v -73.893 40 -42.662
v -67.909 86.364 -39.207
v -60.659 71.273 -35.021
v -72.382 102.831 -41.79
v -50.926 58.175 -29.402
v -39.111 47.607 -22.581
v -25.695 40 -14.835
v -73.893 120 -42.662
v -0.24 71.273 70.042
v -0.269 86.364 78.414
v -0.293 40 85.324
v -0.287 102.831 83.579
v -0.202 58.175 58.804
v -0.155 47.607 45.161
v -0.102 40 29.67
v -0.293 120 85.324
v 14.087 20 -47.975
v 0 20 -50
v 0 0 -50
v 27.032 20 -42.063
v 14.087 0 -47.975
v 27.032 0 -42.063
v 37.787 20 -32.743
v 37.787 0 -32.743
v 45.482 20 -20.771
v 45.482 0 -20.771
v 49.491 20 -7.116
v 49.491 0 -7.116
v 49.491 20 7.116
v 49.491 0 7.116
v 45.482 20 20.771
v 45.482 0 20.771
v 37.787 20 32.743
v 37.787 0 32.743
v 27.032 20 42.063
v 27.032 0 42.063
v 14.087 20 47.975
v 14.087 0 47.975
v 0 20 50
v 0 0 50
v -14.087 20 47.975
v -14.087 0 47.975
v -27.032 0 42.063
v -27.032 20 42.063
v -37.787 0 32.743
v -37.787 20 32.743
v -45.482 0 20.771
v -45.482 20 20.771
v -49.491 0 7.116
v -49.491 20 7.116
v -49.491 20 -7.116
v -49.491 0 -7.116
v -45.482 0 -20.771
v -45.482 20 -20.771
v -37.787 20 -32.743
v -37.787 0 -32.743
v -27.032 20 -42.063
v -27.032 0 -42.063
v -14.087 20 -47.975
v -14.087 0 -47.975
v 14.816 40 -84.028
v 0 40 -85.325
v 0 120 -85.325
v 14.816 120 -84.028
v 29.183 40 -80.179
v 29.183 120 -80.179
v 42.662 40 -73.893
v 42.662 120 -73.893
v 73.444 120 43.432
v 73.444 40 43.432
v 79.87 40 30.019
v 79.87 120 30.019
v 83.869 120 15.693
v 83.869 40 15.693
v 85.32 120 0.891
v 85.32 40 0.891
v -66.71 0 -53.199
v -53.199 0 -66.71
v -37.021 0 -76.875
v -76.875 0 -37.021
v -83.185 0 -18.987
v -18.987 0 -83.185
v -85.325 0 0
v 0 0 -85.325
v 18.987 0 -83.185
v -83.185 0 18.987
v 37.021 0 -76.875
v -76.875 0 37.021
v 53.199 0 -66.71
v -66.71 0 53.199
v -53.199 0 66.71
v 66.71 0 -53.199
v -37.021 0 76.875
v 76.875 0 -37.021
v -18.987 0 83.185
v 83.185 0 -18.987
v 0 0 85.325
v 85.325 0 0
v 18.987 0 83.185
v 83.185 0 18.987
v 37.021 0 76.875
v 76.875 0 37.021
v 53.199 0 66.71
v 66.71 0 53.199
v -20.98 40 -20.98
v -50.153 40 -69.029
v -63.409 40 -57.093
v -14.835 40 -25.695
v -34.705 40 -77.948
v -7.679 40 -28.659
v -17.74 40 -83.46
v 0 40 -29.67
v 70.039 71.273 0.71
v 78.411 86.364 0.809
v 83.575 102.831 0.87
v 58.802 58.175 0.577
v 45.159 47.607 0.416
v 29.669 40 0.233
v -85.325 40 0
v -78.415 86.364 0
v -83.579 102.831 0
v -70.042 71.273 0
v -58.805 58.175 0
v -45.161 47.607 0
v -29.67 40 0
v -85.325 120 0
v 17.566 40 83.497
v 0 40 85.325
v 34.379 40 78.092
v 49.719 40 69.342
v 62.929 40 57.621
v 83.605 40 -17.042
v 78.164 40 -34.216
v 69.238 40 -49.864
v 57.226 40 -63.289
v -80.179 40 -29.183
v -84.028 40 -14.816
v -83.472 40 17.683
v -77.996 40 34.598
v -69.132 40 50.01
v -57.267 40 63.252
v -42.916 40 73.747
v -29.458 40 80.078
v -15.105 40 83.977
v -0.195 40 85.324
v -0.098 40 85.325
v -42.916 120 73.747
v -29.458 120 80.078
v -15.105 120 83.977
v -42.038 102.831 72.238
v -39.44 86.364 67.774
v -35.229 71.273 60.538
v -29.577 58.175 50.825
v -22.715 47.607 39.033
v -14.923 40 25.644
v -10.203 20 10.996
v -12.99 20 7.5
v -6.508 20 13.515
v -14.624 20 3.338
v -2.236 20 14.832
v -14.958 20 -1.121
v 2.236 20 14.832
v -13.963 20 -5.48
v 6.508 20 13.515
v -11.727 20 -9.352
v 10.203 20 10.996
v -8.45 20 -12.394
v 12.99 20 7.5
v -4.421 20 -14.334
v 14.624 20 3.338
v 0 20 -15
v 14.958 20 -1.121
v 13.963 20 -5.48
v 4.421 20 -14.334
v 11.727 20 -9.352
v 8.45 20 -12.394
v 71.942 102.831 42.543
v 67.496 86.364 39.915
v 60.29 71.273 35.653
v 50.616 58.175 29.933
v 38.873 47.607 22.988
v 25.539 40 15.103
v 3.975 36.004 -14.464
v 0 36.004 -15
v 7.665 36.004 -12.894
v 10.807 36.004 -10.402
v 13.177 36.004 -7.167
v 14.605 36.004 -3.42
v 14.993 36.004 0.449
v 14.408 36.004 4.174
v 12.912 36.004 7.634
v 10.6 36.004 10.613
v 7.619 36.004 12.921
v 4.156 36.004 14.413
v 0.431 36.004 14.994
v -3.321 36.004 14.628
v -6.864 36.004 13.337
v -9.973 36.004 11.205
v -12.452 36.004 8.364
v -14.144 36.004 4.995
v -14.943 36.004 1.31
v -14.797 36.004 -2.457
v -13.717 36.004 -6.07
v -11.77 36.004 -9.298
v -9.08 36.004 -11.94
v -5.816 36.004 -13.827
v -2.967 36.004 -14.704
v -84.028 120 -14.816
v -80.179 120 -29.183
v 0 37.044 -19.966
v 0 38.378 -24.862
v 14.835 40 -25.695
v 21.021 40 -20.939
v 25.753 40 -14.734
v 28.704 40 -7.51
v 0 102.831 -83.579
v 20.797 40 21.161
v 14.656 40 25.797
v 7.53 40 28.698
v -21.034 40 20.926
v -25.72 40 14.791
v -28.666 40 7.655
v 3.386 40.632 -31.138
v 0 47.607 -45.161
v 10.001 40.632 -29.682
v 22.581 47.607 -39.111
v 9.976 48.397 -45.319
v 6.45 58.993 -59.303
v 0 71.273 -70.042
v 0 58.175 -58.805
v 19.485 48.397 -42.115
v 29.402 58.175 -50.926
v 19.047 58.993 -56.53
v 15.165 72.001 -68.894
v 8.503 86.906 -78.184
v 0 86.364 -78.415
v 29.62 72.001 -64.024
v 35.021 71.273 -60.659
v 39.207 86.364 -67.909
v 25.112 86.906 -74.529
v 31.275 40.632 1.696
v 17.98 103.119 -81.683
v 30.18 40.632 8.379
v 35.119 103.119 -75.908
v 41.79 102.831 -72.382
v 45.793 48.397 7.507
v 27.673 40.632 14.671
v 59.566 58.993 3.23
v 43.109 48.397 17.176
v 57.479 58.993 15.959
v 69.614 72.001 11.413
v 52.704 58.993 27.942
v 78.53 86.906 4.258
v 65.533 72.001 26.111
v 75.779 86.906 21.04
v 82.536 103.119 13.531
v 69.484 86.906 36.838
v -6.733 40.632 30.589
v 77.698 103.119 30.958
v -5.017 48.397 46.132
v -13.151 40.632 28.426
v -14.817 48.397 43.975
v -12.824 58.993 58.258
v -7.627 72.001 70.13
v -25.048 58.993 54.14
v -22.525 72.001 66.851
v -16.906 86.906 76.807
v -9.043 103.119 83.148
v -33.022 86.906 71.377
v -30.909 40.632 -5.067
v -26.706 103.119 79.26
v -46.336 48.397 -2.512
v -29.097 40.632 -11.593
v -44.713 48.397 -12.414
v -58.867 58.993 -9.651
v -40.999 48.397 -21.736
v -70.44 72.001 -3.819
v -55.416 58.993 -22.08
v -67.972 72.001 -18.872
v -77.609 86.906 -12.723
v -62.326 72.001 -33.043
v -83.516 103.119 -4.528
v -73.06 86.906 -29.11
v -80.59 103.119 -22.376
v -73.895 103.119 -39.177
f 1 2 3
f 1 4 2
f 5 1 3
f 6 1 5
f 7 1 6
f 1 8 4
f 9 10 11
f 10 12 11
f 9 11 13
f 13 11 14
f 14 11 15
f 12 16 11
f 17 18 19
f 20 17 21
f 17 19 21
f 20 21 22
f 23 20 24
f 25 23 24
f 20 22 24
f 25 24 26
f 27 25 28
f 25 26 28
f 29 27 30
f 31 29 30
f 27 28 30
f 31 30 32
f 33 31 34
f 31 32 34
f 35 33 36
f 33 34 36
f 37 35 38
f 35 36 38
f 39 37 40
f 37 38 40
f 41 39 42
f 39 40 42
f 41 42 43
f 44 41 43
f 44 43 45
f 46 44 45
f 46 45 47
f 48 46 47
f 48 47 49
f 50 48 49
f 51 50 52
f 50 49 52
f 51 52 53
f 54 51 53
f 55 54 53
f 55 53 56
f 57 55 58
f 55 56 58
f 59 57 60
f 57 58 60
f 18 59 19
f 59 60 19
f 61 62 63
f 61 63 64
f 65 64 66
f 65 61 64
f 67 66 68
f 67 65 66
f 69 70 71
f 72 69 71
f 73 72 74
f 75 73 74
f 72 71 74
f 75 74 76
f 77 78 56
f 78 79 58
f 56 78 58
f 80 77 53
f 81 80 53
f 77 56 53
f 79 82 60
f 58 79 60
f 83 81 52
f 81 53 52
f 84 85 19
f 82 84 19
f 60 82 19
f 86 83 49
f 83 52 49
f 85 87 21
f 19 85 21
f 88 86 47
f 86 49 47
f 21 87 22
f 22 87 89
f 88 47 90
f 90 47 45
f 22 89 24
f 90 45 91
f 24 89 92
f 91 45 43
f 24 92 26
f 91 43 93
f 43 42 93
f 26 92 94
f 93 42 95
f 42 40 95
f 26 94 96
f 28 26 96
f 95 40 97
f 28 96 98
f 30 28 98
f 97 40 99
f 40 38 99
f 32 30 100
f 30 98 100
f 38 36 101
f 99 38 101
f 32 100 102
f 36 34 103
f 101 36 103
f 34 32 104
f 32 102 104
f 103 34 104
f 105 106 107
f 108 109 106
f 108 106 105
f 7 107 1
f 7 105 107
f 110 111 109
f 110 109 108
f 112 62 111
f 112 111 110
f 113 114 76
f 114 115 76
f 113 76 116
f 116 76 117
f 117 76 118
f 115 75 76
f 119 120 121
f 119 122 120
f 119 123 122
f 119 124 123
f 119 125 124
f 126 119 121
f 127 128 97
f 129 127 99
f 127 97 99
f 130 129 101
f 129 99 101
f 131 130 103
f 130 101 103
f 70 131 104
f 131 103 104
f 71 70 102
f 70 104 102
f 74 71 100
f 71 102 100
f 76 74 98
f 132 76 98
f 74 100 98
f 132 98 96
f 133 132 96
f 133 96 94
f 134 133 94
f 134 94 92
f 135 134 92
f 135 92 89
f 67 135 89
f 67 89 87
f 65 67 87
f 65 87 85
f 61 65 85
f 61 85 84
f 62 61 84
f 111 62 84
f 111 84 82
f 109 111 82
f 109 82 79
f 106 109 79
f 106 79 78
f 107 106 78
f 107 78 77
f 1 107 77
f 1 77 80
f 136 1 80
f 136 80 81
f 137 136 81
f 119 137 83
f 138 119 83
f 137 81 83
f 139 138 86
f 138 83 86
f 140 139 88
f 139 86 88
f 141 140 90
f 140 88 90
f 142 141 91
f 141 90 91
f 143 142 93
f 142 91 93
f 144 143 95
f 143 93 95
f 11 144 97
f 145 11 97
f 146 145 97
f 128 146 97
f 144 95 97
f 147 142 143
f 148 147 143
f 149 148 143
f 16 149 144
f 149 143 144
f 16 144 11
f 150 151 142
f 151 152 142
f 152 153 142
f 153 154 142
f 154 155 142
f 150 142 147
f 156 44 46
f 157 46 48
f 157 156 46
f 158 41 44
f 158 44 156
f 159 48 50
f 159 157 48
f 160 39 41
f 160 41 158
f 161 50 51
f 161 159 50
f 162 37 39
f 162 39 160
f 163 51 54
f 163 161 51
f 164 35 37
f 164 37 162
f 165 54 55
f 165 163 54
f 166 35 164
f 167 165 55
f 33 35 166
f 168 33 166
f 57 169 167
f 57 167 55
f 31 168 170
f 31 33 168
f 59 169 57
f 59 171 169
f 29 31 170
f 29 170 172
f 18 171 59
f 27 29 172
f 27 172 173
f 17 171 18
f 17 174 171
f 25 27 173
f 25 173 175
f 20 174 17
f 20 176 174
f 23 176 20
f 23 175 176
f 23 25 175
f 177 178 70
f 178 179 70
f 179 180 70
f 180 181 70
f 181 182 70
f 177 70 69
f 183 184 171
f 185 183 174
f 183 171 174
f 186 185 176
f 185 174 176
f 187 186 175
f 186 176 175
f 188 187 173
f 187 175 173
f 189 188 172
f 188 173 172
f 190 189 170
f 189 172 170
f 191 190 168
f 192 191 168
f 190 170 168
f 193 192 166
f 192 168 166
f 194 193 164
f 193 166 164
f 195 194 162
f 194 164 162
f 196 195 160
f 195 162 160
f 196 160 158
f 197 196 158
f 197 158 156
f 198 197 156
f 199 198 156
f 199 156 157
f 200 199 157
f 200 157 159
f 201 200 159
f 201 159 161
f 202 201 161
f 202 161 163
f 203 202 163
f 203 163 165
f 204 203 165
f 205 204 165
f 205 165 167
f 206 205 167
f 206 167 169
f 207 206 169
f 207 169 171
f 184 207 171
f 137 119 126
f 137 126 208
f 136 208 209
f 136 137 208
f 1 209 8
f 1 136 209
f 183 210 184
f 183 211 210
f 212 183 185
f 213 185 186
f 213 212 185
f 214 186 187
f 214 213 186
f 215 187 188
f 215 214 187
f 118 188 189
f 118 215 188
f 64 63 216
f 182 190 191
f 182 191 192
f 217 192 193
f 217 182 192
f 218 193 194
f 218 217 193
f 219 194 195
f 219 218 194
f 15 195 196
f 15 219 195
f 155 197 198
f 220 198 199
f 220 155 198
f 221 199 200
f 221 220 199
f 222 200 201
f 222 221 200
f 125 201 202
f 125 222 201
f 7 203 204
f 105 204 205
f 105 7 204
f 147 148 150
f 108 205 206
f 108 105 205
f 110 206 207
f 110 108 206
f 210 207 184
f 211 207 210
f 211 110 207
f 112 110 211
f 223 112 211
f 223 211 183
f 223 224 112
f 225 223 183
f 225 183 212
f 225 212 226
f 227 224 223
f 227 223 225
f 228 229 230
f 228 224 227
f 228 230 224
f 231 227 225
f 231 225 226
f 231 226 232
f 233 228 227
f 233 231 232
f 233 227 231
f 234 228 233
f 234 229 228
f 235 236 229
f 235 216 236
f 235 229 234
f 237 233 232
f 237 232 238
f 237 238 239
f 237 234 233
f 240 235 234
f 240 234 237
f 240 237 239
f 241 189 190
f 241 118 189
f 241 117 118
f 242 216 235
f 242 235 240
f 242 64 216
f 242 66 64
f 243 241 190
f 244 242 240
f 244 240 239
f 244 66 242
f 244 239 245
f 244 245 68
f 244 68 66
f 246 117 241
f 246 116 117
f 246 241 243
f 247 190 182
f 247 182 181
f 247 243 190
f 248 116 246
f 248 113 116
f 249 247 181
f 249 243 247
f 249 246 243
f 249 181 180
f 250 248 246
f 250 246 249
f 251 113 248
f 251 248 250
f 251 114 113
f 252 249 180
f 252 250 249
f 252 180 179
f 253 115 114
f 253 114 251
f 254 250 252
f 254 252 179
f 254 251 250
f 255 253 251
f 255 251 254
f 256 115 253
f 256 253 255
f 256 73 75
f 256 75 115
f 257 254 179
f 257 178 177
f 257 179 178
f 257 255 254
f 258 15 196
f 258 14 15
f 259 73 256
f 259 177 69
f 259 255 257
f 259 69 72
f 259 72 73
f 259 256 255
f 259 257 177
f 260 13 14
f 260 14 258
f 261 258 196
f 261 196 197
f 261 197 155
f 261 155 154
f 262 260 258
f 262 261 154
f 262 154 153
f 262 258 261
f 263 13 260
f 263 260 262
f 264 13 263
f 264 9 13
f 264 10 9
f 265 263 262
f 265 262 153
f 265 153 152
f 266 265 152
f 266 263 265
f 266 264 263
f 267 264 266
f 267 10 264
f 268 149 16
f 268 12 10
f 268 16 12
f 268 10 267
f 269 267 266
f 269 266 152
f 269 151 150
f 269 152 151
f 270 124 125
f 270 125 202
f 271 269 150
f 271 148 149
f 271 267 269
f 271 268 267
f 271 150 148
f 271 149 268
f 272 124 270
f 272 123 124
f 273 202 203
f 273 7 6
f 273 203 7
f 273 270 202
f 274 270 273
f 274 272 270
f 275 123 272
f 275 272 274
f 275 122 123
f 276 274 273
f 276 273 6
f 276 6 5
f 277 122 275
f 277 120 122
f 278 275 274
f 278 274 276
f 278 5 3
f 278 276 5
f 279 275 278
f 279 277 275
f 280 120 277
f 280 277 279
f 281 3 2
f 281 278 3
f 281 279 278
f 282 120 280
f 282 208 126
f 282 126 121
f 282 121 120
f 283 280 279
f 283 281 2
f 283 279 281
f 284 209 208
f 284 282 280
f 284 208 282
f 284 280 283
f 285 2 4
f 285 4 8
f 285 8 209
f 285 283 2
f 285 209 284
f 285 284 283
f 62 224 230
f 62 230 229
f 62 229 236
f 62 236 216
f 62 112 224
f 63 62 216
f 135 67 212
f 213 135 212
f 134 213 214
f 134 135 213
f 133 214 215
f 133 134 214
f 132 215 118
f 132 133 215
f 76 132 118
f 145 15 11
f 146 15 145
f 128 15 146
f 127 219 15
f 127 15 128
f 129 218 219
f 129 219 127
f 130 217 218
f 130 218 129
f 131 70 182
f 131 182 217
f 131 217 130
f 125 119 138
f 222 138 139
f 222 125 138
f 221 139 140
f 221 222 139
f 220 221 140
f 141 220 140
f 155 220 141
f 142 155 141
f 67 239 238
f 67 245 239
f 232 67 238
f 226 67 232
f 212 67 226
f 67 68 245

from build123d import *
from build123d.topology import SkipClean

# Parameters (mm, degrees)
SKETCH1_R           = 85.32472163
BOSS_EXTRUDE1_DEPTH = 40
BOSS_EXTRUDE6_DEPTH = 80
SKETCH7_R           = 50
CUT_EXTRUDE1_DEPTH  = 20
SKETCH8_R           = 15
CUT_EXTRUDE2_DEPTH  = 60


with BuildPart() as part:
    # Sketch1 → Boss-Extrude1 (new body)
    with BuildSketch(Plane(origin=(0, 0, 0), x_dir=(1, 0, 0), z_dir=(0, 1, 0))):
        with Locations(Location((0, 0, 0), (0, 0, 270))):
            Circle(SKETCH1_R)
    extrude(amount=BOSS_EXTRUDE1_DEPTH)

    # Sketch2 → Boss-Extrude6 (add)
    with SkipClean():  # the faces are left unmerged after this step: merging them gives an invalid solid
        with BuildSketch(Plane(origin=(0, 40, 0), x_dir=(1, 0, 0), z_dir=(0, 1, 0))):
            with BuildLine():
                Line((8.607565416, -5.090168722), (73.443812301, -43.431722922))
                ThreePointArc((73.443812301, -43.431722922), (82.182232136, -22.943165483), (85.320068664, -0.89106923))
                Line((85.320068664, -0.89106923), (10, 0))
                ThreePointArc((10, 0), (9.645611804, -2.638592981), (8.607565416, -5.090168722))
            make_face()
            with BuildLine():
                Line((-5.02968533, -8.643047234), (-42.915650066, -73.746559925))
                ThreePointArc((-42.915650066, -73.746559925), (-22.366320531, -82.341094401), (-0.292763215, -85.324219369))
                Line((-0.292763215, -85.324219369), (-0.034311652, -9.999941135))
                ThreePointArc((-0.034311652, -9.999941135), (-2.621317726, -9.650320895), (-5.02968533, -8.643047234))
            make_face()
            with BuildLine():
                Line((-10, 0), (-85.32472163, 0))
                ThreePointArc((-85.32472163, 0), (-82.417352244, 22.083662976), (-73.893376503, 42.662360815))
                Line((-73.893376503, 42.662360815), (-8.660254038, 5))
                ThreePointArc((-8.660254038, 5), (-9.659258263, 2.588190451), (-10, 0))
            make_face()
            with BuildLine():
                Line((0, 10), (0, 85.32472163))
                ThreePointArc((0, 85.32472163), (22.083662976, 82.417352244), (42.662360815, 73.893376503))
                Line((42.662360815, 73.893376503), (5, 8.660254038))
                ThreePointArc((5, 8.660254038), (2.588190451, 9.659258263), (0, 10))
            make_face()
        extrude(amount=BOSS_EXTRUDE6_DEPTH)

    # Sketch6 → Cut-Revolve1 (revolve, cut)
    with SkipClean():  # the faces are left unmerged after this step: merging them gives an invalid solid
        with BuildSketch(Plane(origin=(0, 0, 0), x_dir=(0.5000000000000012, 0, -0.866025403784438), z_dir=(0.8660254037844379, 0, 0.5000000000000011)), mode=Mode.PRIVATE) as cut_revolve1_sk:
            with BuildLine():
                Line((85.32472163, 120), (0, 120))
                Line((0, 120), (0, 34.67527837))
                ThreePointArc((0, 34.67527837), (60.333689268, 59.666310732), (85.32472163, 120))
            make_face()
        revolve(cut_revolve1_sk.sketch.rotate(Axis((0, 120, 0), (0, -1, 0)), 330), axis=Axis((0, 120, 0), (0, -1, 0)), mode=Mode.SUBTRACT)

    # Sketch7 → Cut-Extrude1 (cut)
    with SkipClean():  # the faces are left unmerged after this step: merging them gives an invalid solid
        with BuildSketch(Plane.XZ):
            with Locations(Location((0, 0, 0), (0, 0, 270))):
                Circle(SKETCH7_R)
        extrude(amount=-CUT_EXTRUDE1_DEPTH, mode=Mode.SUBTRACT)

    # Sketch8 → Cut-Extrude2 (cut)
    with SkipClean():  # the faces are left unmerged after this step: merging them gives an invalid solid
        with BuildSketch(Plane.XZ.offset(-20)):
            with Locations(Location((0, 0, 0), (0, 0, 270))):
                Circle(SKETCH8_R)
        extrude(amount=-CUT_EXTRUDE2_DEPTH, mode=Mode.SUBTRACT)


solid = part.part
